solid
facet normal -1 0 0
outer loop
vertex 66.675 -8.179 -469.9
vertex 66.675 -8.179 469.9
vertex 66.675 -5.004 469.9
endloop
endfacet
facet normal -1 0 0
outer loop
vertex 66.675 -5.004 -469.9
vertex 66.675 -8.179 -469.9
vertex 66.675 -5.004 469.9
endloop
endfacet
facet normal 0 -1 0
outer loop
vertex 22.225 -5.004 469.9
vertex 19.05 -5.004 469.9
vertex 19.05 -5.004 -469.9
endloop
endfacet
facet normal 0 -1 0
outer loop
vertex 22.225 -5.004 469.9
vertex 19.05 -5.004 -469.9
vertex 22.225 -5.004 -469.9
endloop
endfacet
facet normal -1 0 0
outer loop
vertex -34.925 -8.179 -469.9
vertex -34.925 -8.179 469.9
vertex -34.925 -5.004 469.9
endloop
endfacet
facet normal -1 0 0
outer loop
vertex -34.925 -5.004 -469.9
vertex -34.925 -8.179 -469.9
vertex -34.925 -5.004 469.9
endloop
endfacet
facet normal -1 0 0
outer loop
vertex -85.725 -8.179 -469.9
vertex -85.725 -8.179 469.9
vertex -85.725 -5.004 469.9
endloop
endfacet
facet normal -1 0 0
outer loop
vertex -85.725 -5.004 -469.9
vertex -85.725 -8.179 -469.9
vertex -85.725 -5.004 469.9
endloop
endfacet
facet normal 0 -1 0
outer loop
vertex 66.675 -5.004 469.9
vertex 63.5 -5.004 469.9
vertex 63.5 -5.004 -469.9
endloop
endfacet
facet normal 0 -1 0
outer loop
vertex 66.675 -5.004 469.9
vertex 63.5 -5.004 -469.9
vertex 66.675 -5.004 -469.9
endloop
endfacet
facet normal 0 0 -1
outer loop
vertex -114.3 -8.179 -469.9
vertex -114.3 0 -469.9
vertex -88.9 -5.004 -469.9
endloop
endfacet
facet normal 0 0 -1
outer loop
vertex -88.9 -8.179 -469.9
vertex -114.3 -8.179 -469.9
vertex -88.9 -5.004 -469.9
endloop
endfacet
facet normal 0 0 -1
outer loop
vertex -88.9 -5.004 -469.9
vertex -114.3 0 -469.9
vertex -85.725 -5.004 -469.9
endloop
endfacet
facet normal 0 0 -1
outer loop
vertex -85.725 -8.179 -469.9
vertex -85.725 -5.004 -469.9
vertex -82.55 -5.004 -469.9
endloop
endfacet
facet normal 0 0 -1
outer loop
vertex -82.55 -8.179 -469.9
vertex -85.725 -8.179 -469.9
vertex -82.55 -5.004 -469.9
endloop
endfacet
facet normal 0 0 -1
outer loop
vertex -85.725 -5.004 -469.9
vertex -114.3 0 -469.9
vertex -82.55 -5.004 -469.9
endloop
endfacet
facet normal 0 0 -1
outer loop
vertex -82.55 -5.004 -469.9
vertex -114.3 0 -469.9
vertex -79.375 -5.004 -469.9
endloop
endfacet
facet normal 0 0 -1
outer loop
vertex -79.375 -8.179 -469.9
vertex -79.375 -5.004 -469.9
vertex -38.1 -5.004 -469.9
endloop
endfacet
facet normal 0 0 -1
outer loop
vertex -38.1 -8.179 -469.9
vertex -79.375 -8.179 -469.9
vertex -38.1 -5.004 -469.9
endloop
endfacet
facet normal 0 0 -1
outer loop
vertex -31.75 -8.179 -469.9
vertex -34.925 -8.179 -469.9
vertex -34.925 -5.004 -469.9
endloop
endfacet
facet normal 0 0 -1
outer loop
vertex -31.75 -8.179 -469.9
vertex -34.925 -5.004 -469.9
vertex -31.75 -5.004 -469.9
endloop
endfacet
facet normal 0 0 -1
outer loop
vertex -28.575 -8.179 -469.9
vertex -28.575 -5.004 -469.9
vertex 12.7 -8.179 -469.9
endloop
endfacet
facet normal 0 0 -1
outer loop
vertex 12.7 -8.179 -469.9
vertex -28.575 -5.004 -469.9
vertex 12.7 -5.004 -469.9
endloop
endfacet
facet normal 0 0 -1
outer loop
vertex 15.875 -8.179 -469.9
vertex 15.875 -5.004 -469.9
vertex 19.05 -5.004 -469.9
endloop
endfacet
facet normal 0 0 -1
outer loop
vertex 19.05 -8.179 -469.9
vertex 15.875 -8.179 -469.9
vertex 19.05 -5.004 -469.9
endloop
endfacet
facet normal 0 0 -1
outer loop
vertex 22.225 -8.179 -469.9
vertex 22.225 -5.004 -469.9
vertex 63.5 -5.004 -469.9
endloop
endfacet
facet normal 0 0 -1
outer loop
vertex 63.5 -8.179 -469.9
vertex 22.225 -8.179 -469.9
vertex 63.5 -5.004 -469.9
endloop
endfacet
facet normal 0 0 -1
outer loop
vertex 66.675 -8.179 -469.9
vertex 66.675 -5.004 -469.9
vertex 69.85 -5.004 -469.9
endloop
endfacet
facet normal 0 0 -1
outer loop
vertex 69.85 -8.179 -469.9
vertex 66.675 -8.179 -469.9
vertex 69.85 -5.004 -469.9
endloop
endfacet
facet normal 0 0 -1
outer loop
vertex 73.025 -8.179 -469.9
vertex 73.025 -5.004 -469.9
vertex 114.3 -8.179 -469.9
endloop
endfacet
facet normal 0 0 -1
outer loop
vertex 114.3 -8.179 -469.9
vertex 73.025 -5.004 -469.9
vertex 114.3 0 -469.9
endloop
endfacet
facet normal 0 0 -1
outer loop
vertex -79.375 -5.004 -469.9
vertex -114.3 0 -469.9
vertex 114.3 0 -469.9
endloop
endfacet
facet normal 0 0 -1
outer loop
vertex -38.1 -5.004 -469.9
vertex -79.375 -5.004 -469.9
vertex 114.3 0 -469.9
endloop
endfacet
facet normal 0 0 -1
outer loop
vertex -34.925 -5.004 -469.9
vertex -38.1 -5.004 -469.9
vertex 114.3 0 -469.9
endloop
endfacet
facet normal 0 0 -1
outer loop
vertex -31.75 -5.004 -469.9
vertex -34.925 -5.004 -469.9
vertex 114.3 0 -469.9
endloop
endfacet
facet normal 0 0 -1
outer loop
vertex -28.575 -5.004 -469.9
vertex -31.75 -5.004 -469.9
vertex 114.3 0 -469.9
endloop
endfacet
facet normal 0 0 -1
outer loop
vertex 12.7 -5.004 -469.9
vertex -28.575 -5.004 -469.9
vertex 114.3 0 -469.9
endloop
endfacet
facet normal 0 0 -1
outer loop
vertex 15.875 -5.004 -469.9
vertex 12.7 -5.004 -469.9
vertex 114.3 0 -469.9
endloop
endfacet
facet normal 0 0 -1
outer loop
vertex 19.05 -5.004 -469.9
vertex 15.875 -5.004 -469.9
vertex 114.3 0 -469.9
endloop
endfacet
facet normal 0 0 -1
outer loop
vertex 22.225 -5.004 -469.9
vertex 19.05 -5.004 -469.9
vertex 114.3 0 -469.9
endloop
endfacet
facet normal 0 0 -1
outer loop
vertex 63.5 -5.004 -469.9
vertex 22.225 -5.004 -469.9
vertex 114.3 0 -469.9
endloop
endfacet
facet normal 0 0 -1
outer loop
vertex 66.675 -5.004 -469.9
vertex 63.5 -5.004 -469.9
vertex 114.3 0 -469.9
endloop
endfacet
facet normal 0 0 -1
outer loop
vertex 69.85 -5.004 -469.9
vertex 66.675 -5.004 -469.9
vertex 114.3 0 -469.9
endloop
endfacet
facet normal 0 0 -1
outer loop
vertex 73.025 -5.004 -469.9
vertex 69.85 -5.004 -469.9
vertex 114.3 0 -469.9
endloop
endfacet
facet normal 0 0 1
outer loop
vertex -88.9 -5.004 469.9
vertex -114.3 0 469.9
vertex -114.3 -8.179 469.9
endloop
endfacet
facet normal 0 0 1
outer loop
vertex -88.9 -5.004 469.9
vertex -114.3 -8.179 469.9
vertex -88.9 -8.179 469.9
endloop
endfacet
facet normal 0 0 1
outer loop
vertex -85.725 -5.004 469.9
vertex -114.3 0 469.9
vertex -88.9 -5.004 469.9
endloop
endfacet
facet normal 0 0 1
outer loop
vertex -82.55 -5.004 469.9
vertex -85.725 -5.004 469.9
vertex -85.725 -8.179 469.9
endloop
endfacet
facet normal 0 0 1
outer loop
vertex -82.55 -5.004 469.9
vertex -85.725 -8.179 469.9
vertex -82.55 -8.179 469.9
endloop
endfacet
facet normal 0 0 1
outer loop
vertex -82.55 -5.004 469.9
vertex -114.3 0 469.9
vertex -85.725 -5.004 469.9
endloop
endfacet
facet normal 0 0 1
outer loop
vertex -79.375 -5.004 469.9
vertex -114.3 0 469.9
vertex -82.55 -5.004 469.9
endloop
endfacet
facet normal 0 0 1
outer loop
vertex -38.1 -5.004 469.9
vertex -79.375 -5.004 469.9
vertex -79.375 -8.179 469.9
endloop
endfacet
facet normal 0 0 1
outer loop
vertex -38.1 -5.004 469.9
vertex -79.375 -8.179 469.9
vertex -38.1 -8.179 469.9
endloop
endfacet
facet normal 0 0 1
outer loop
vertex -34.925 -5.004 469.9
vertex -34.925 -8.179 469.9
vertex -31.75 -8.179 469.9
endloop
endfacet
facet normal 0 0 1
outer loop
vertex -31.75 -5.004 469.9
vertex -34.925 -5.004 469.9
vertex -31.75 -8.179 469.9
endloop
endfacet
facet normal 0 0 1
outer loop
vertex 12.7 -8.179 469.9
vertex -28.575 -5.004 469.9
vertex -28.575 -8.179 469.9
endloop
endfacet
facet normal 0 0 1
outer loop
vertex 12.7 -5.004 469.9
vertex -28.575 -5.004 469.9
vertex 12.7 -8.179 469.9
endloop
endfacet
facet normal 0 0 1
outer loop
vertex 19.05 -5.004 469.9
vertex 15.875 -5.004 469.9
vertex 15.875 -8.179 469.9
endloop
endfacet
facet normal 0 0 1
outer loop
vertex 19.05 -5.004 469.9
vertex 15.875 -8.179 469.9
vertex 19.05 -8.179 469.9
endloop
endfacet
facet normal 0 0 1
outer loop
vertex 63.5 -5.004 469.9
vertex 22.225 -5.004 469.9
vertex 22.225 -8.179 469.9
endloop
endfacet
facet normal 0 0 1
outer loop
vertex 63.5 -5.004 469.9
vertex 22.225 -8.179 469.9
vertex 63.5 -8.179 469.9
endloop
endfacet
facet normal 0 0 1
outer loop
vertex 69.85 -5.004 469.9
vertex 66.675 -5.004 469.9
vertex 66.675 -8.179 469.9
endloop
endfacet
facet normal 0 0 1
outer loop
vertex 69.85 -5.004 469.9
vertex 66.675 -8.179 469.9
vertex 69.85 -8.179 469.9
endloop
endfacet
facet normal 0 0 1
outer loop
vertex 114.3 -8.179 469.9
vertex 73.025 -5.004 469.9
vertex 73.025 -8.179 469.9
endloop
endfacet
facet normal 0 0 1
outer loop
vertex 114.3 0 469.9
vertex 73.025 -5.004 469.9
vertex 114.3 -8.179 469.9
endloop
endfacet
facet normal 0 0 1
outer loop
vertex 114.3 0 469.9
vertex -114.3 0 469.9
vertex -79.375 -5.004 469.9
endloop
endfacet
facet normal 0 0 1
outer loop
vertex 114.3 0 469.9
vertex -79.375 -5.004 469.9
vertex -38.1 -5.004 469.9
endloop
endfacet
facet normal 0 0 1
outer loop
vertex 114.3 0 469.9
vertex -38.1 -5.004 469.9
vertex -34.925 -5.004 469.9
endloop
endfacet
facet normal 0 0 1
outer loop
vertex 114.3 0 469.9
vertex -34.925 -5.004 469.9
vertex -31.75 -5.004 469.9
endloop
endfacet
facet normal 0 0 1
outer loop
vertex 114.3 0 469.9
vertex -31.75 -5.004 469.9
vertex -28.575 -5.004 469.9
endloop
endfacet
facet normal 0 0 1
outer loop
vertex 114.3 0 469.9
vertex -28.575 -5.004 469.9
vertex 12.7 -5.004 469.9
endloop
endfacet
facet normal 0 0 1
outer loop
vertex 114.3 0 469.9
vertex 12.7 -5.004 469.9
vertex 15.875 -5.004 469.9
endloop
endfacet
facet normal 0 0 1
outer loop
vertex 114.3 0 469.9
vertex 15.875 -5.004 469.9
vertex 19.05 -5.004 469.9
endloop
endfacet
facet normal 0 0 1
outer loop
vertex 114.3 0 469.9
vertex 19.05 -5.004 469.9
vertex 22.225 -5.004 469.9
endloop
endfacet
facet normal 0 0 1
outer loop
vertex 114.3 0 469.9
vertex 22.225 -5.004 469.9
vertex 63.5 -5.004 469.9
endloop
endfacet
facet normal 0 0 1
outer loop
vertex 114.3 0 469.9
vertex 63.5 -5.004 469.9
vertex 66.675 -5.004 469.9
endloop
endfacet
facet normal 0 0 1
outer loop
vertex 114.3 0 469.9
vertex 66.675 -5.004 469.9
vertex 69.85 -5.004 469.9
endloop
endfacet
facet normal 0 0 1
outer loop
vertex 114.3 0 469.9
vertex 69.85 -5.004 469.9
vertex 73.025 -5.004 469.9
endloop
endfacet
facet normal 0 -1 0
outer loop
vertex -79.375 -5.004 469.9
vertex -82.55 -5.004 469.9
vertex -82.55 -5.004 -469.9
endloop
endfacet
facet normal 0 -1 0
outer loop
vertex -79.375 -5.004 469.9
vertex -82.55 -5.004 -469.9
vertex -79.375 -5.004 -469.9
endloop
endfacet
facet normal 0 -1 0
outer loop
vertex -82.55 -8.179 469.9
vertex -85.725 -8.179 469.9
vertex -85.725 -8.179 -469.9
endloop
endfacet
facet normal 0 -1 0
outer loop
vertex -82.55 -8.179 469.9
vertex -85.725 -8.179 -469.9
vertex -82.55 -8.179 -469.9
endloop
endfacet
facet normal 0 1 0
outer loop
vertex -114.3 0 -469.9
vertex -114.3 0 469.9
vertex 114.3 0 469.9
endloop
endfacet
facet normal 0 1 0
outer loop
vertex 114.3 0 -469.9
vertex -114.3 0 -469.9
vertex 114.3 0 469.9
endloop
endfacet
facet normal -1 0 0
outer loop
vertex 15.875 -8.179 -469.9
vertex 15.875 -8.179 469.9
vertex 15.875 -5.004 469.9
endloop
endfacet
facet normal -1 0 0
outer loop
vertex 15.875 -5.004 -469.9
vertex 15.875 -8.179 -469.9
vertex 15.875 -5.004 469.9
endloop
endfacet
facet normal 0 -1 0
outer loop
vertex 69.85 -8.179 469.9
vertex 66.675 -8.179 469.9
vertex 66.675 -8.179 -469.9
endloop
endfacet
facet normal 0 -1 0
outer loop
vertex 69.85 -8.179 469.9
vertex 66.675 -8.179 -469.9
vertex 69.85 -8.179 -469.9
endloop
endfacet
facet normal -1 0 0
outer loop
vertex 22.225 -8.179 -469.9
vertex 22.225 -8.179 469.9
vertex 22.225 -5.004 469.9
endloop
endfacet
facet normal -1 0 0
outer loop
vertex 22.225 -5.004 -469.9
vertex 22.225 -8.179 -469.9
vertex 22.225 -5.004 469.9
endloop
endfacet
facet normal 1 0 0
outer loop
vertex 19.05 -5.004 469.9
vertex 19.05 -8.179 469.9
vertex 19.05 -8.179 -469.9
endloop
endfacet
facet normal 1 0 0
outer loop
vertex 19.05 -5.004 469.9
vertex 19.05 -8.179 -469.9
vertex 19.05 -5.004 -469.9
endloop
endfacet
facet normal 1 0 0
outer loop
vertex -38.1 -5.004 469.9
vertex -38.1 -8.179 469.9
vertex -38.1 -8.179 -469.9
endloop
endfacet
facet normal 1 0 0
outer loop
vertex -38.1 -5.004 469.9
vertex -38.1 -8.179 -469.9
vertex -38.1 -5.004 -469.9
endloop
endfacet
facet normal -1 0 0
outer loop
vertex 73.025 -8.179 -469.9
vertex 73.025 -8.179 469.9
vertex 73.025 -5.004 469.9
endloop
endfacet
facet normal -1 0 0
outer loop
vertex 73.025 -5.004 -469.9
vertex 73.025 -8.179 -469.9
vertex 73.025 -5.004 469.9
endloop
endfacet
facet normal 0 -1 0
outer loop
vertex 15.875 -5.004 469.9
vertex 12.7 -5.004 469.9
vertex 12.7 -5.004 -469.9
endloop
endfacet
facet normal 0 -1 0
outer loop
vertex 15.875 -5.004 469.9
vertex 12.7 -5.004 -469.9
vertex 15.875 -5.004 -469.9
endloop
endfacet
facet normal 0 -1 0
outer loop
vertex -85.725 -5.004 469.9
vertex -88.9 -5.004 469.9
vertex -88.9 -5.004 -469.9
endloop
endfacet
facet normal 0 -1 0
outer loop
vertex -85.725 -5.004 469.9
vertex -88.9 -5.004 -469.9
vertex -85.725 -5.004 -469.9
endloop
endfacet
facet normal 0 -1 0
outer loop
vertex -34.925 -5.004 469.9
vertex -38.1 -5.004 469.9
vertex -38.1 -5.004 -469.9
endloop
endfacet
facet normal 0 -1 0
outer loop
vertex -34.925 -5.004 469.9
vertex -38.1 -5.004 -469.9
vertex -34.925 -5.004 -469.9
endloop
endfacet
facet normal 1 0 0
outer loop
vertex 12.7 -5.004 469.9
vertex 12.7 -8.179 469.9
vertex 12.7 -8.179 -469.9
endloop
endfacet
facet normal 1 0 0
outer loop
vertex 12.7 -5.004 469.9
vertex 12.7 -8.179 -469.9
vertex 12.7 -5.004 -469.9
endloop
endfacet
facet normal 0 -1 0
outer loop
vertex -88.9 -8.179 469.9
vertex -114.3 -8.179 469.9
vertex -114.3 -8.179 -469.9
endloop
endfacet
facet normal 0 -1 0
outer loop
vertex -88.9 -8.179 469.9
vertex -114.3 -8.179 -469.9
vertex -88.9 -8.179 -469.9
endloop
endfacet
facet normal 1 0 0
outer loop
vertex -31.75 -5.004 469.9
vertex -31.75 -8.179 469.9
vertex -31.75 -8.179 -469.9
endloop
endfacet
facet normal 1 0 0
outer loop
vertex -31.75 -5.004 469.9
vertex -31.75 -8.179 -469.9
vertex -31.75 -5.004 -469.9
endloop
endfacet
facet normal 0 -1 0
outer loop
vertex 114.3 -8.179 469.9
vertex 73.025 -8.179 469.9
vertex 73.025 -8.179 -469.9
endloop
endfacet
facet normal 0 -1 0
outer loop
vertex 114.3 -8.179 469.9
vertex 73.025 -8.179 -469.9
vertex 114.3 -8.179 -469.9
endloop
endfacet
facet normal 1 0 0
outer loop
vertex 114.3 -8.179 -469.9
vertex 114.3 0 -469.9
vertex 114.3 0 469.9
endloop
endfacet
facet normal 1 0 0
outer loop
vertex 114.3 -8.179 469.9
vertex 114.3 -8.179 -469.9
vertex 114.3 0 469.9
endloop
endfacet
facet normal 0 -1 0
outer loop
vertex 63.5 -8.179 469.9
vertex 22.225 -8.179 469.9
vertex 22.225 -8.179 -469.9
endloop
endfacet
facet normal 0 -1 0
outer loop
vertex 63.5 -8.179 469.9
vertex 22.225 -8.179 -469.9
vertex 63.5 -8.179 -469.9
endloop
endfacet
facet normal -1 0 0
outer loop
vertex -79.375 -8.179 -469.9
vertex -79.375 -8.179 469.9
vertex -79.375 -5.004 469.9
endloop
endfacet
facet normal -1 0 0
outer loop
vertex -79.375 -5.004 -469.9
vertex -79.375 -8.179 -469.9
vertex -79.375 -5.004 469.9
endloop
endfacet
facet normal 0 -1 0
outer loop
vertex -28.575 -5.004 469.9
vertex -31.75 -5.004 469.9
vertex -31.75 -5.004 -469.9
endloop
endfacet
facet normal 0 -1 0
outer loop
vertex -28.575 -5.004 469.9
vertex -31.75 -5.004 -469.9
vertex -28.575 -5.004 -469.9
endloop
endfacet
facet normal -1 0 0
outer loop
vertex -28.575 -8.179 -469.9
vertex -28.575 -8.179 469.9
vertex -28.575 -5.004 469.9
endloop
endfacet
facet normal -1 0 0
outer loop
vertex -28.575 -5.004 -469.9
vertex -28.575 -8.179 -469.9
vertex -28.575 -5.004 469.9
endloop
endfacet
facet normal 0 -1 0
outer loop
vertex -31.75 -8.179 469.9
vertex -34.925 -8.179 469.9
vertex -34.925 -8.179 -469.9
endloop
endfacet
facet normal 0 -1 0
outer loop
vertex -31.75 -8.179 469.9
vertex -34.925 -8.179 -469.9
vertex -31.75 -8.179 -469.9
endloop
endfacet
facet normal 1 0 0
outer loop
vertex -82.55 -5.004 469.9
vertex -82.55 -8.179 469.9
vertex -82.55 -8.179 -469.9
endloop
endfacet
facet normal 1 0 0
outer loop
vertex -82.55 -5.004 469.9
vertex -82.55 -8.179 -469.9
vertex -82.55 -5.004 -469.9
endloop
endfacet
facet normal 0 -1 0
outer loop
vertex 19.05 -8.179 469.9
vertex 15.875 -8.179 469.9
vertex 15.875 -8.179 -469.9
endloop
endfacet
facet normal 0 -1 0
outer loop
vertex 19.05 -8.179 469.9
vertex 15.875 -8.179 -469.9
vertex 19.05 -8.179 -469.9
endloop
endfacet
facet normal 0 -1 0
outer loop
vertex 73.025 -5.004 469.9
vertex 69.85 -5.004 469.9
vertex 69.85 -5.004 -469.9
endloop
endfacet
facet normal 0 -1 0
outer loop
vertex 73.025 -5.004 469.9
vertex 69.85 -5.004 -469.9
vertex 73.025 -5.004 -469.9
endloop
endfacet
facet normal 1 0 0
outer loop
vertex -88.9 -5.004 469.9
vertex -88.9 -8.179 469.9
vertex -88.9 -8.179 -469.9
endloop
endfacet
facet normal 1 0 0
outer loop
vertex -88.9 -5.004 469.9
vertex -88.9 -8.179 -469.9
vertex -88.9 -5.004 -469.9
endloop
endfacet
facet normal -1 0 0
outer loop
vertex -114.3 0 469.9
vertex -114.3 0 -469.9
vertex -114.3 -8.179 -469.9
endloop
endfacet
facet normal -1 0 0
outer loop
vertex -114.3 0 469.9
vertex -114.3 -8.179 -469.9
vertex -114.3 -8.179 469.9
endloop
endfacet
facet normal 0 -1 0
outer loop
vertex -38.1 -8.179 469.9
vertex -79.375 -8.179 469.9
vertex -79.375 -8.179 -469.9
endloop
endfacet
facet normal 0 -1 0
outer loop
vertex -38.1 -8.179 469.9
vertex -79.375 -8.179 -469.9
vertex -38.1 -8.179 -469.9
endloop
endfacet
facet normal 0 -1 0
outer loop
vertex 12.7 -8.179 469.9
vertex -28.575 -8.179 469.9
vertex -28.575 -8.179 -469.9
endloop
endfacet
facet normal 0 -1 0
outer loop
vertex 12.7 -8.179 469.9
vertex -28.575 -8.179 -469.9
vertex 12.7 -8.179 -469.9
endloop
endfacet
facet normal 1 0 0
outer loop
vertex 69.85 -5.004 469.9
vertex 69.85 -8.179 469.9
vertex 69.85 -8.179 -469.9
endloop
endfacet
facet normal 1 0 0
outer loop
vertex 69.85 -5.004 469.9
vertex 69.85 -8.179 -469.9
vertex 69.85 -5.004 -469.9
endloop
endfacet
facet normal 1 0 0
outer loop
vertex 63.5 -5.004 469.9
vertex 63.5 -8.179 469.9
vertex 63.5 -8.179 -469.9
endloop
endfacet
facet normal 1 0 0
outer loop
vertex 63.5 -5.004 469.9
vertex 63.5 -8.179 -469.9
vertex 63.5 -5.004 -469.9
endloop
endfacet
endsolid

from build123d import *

# Parameters (mm, degrees)
F0_W     = 228.6
F0_H     = 939.8
F1_DEPTH = 8.1788
F2_W     = 3.175
F2_H     = 3.175
F3_DEPTH = 939.801


with BuildPart() as f1:
    # F0 (on Front) → F1 (new body)
    with BuildSketch(Plane.XZ):
        Rectangle(F0_W, F0_H)
    extrude(amount=F1_DEPTH)

    # F2 (on face) → F3 (cut, through all)
    with BuildSketch(Plane.XY.offset(469.9)):
        with Locations((-87.3125, -6.5913)):
            Rectangle(F2_W, F2_H)
        with Locations((-80.9625, -6.5913)):
            Rectangle(F2_W, F2_H)
        with Locations((-36.5125, -6.5913)):
            Rectangle(F2_W, F2_H)
        with Locations((-30.1625, -6.5913)):
            Rectangle(F2_W, F2_H)
        with Locations((14.2875, -6.5913)):
            Rectangle(F2_W, F2_H)
        with Locations((20.6375, -6.5913)):
            Rectangle(F2_W, F2_H)
        with Locations((65.0875, -6.5913)):
            Rectangle(F2_W, F2_H)
        with Locations((71.4375, -6.5913)):
            Rectangle(F2_W, F2_H)
    extrude(amount=-F3_DEPTH, mode=Mode.SUBTRACT)


solid = f1.part
